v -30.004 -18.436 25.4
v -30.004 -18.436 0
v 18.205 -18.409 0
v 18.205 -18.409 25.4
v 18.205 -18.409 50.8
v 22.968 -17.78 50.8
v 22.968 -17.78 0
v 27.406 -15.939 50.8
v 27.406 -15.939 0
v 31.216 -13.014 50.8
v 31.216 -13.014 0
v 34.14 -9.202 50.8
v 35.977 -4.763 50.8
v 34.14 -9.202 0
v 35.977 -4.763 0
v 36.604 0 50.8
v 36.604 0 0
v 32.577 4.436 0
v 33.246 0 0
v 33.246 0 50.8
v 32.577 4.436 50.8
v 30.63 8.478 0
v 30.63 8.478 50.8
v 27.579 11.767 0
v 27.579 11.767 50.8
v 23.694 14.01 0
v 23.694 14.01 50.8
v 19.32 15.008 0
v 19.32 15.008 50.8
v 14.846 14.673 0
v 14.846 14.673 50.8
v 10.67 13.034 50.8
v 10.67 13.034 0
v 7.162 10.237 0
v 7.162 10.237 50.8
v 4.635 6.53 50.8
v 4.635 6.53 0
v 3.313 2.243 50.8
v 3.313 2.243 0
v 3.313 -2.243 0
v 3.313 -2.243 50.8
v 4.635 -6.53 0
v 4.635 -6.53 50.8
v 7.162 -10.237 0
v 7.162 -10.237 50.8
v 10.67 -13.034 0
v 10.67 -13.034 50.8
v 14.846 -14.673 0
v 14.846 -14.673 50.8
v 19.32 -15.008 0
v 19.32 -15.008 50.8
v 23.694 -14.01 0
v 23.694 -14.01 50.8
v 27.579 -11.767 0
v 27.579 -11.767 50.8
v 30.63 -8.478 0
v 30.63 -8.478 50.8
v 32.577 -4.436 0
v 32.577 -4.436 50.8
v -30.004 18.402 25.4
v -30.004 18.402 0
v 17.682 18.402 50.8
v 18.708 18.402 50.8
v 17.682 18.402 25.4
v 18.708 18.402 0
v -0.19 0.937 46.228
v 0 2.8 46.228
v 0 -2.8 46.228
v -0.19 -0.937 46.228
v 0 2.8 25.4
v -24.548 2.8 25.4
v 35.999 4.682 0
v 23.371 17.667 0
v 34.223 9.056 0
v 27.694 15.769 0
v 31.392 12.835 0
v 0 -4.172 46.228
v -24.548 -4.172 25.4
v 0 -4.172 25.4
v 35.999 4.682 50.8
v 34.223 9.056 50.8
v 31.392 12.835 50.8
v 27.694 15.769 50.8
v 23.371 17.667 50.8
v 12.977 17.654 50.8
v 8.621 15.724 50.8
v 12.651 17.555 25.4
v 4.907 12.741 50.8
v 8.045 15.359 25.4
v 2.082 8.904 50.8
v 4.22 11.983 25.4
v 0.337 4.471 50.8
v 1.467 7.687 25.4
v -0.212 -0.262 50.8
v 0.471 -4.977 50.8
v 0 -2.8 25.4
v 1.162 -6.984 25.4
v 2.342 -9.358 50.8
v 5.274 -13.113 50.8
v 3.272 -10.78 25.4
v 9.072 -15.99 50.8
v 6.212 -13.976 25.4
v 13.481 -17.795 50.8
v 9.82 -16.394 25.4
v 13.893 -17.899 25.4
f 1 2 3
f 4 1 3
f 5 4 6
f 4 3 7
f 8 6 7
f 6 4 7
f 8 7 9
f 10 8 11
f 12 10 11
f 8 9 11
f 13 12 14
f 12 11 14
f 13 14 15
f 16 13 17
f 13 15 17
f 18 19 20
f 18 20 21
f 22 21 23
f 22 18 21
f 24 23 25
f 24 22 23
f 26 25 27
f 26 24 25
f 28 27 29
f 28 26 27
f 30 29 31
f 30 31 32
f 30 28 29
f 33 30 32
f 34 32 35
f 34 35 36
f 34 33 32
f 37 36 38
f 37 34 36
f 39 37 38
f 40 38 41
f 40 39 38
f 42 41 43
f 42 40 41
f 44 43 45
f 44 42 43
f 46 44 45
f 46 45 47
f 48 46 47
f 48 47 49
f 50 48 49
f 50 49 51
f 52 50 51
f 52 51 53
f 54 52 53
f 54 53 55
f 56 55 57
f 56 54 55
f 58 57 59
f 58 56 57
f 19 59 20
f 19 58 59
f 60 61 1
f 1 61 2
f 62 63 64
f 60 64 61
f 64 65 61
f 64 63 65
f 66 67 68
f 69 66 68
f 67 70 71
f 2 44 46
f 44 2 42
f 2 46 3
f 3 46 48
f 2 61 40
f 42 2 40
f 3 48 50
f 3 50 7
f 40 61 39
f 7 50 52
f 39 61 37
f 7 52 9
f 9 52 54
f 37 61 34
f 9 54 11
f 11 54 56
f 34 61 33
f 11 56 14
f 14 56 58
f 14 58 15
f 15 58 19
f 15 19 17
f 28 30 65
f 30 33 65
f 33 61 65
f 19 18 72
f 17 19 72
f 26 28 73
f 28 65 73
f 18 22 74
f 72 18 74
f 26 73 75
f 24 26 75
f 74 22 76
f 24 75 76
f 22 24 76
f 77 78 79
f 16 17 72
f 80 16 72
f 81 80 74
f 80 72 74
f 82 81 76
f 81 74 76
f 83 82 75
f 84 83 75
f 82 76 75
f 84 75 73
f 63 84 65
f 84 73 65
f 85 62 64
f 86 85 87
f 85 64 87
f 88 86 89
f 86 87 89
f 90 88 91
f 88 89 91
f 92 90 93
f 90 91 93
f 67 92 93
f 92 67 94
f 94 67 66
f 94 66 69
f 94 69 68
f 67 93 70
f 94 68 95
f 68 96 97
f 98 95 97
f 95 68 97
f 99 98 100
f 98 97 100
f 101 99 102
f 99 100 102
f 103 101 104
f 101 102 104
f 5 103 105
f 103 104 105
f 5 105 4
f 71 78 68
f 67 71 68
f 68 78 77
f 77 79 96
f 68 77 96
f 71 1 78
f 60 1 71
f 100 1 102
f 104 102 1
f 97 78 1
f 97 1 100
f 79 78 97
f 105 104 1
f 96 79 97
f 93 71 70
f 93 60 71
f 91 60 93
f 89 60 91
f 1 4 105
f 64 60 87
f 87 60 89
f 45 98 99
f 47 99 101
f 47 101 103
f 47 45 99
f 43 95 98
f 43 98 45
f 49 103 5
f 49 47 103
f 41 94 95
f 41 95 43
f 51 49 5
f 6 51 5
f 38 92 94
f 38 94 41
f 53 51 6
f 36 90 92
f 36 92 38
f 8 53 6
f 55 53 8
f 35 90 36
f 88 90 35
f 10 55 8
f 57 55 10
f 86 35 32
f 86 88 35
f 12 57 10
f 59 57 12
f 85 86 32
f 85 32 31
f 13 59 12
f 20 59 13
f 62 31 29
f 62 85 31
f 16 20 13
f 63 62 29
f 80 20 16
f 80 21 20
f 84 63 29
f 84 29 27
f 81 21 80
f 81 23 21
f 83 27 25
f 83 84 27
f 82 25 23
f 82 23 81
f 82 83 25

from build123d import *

# Parameters (mm, degrees)
F1_DEPTH = 25.4
F0_R     = 15.0505482929
F2_DEPTH = 50.8
F4_DEPTH = 20.828
F6_DEPTH = 25.4


with BuildPart() as f1:
    # F0 (on Top) → F1 (new body)
    with BuildSketch(Plane.XY):
        with BuildLine():
            Line((-30.0037506968, -18.4360407293), (18.2052805233, -18.4092394559))
            ThreePointArc((18.2052805233, -18.4092394559), (-0.2123373289, -0.2616045695), (17.6821201623, 18.4020952356))
            Line((17.6821201623, 18.4020952356), (-30.0037506968, 18.4020952356))
            Line((-30.0037506968, 18.4020952356), (-30.0037506968, -18.4360407293))
        make_face()
    extrude(amount=F1_DEPTH)

    # F0 (on Top) → F2 (join)
    with BuildSketch(Plane.XY):
        with BuildLine():
            ThreePointArc((18.2052805233, -18.4092394559), (31.2159640874, -13.0136811535), (36.6042884127, 0))
            ThreePointArc((36.6042884127, 0), (31.3924469958, 12.8346722592), (18.7079720616, 18.4020952356))
            Line((18.7079720616, 18.4020952356), (17.6821201623, 18.4020952356))
            ThreePointArc((17.6821201623, 18.4020952356), (-0.2123373289, -0.2616045695), (18.2052805233, -18.4092394559))
        make_face()
        with Locations((18.1950461119, 0)):
            Circle(F0_R, mode=Mode.SUBTRACT)
    extrude(amount=F2_DEPTH)

    # F3 (on face) → F4 (join)
    with BuildSketch(Plane.XY.offset(25.4)):
        with BuildLine():
            ThreePointArc((0, -2.8000891188), (-0.2141961888, 0), (0, 2.8000891188))
            Line((0, 2.8000891188), (-24.5482716709, 2.8000891188))
            Line((-24.5482716709, 2.8000891188), (-24.5482716709, -4.1717705317))
            Line((-24.5482716709, -4.1717705317), (0, -4.1717705317))
            Line((0, -4.1717705317), (0, -2.8000891188))
        make_face()
    extrude(amount=F4_DEPTH)

    # F5 (on face) → F6 (cut)
    with BuildSketch(Plane.XZ.offset(4.1717705317)):
        Polygon((-24.5482716709, 25.4), (0, 46.228), (-24.5482716709, 46.228), align=None)
    extrude(amount=-F6_DEPTH, mode=Mode.SUBTRACT)


solid = f1.part
